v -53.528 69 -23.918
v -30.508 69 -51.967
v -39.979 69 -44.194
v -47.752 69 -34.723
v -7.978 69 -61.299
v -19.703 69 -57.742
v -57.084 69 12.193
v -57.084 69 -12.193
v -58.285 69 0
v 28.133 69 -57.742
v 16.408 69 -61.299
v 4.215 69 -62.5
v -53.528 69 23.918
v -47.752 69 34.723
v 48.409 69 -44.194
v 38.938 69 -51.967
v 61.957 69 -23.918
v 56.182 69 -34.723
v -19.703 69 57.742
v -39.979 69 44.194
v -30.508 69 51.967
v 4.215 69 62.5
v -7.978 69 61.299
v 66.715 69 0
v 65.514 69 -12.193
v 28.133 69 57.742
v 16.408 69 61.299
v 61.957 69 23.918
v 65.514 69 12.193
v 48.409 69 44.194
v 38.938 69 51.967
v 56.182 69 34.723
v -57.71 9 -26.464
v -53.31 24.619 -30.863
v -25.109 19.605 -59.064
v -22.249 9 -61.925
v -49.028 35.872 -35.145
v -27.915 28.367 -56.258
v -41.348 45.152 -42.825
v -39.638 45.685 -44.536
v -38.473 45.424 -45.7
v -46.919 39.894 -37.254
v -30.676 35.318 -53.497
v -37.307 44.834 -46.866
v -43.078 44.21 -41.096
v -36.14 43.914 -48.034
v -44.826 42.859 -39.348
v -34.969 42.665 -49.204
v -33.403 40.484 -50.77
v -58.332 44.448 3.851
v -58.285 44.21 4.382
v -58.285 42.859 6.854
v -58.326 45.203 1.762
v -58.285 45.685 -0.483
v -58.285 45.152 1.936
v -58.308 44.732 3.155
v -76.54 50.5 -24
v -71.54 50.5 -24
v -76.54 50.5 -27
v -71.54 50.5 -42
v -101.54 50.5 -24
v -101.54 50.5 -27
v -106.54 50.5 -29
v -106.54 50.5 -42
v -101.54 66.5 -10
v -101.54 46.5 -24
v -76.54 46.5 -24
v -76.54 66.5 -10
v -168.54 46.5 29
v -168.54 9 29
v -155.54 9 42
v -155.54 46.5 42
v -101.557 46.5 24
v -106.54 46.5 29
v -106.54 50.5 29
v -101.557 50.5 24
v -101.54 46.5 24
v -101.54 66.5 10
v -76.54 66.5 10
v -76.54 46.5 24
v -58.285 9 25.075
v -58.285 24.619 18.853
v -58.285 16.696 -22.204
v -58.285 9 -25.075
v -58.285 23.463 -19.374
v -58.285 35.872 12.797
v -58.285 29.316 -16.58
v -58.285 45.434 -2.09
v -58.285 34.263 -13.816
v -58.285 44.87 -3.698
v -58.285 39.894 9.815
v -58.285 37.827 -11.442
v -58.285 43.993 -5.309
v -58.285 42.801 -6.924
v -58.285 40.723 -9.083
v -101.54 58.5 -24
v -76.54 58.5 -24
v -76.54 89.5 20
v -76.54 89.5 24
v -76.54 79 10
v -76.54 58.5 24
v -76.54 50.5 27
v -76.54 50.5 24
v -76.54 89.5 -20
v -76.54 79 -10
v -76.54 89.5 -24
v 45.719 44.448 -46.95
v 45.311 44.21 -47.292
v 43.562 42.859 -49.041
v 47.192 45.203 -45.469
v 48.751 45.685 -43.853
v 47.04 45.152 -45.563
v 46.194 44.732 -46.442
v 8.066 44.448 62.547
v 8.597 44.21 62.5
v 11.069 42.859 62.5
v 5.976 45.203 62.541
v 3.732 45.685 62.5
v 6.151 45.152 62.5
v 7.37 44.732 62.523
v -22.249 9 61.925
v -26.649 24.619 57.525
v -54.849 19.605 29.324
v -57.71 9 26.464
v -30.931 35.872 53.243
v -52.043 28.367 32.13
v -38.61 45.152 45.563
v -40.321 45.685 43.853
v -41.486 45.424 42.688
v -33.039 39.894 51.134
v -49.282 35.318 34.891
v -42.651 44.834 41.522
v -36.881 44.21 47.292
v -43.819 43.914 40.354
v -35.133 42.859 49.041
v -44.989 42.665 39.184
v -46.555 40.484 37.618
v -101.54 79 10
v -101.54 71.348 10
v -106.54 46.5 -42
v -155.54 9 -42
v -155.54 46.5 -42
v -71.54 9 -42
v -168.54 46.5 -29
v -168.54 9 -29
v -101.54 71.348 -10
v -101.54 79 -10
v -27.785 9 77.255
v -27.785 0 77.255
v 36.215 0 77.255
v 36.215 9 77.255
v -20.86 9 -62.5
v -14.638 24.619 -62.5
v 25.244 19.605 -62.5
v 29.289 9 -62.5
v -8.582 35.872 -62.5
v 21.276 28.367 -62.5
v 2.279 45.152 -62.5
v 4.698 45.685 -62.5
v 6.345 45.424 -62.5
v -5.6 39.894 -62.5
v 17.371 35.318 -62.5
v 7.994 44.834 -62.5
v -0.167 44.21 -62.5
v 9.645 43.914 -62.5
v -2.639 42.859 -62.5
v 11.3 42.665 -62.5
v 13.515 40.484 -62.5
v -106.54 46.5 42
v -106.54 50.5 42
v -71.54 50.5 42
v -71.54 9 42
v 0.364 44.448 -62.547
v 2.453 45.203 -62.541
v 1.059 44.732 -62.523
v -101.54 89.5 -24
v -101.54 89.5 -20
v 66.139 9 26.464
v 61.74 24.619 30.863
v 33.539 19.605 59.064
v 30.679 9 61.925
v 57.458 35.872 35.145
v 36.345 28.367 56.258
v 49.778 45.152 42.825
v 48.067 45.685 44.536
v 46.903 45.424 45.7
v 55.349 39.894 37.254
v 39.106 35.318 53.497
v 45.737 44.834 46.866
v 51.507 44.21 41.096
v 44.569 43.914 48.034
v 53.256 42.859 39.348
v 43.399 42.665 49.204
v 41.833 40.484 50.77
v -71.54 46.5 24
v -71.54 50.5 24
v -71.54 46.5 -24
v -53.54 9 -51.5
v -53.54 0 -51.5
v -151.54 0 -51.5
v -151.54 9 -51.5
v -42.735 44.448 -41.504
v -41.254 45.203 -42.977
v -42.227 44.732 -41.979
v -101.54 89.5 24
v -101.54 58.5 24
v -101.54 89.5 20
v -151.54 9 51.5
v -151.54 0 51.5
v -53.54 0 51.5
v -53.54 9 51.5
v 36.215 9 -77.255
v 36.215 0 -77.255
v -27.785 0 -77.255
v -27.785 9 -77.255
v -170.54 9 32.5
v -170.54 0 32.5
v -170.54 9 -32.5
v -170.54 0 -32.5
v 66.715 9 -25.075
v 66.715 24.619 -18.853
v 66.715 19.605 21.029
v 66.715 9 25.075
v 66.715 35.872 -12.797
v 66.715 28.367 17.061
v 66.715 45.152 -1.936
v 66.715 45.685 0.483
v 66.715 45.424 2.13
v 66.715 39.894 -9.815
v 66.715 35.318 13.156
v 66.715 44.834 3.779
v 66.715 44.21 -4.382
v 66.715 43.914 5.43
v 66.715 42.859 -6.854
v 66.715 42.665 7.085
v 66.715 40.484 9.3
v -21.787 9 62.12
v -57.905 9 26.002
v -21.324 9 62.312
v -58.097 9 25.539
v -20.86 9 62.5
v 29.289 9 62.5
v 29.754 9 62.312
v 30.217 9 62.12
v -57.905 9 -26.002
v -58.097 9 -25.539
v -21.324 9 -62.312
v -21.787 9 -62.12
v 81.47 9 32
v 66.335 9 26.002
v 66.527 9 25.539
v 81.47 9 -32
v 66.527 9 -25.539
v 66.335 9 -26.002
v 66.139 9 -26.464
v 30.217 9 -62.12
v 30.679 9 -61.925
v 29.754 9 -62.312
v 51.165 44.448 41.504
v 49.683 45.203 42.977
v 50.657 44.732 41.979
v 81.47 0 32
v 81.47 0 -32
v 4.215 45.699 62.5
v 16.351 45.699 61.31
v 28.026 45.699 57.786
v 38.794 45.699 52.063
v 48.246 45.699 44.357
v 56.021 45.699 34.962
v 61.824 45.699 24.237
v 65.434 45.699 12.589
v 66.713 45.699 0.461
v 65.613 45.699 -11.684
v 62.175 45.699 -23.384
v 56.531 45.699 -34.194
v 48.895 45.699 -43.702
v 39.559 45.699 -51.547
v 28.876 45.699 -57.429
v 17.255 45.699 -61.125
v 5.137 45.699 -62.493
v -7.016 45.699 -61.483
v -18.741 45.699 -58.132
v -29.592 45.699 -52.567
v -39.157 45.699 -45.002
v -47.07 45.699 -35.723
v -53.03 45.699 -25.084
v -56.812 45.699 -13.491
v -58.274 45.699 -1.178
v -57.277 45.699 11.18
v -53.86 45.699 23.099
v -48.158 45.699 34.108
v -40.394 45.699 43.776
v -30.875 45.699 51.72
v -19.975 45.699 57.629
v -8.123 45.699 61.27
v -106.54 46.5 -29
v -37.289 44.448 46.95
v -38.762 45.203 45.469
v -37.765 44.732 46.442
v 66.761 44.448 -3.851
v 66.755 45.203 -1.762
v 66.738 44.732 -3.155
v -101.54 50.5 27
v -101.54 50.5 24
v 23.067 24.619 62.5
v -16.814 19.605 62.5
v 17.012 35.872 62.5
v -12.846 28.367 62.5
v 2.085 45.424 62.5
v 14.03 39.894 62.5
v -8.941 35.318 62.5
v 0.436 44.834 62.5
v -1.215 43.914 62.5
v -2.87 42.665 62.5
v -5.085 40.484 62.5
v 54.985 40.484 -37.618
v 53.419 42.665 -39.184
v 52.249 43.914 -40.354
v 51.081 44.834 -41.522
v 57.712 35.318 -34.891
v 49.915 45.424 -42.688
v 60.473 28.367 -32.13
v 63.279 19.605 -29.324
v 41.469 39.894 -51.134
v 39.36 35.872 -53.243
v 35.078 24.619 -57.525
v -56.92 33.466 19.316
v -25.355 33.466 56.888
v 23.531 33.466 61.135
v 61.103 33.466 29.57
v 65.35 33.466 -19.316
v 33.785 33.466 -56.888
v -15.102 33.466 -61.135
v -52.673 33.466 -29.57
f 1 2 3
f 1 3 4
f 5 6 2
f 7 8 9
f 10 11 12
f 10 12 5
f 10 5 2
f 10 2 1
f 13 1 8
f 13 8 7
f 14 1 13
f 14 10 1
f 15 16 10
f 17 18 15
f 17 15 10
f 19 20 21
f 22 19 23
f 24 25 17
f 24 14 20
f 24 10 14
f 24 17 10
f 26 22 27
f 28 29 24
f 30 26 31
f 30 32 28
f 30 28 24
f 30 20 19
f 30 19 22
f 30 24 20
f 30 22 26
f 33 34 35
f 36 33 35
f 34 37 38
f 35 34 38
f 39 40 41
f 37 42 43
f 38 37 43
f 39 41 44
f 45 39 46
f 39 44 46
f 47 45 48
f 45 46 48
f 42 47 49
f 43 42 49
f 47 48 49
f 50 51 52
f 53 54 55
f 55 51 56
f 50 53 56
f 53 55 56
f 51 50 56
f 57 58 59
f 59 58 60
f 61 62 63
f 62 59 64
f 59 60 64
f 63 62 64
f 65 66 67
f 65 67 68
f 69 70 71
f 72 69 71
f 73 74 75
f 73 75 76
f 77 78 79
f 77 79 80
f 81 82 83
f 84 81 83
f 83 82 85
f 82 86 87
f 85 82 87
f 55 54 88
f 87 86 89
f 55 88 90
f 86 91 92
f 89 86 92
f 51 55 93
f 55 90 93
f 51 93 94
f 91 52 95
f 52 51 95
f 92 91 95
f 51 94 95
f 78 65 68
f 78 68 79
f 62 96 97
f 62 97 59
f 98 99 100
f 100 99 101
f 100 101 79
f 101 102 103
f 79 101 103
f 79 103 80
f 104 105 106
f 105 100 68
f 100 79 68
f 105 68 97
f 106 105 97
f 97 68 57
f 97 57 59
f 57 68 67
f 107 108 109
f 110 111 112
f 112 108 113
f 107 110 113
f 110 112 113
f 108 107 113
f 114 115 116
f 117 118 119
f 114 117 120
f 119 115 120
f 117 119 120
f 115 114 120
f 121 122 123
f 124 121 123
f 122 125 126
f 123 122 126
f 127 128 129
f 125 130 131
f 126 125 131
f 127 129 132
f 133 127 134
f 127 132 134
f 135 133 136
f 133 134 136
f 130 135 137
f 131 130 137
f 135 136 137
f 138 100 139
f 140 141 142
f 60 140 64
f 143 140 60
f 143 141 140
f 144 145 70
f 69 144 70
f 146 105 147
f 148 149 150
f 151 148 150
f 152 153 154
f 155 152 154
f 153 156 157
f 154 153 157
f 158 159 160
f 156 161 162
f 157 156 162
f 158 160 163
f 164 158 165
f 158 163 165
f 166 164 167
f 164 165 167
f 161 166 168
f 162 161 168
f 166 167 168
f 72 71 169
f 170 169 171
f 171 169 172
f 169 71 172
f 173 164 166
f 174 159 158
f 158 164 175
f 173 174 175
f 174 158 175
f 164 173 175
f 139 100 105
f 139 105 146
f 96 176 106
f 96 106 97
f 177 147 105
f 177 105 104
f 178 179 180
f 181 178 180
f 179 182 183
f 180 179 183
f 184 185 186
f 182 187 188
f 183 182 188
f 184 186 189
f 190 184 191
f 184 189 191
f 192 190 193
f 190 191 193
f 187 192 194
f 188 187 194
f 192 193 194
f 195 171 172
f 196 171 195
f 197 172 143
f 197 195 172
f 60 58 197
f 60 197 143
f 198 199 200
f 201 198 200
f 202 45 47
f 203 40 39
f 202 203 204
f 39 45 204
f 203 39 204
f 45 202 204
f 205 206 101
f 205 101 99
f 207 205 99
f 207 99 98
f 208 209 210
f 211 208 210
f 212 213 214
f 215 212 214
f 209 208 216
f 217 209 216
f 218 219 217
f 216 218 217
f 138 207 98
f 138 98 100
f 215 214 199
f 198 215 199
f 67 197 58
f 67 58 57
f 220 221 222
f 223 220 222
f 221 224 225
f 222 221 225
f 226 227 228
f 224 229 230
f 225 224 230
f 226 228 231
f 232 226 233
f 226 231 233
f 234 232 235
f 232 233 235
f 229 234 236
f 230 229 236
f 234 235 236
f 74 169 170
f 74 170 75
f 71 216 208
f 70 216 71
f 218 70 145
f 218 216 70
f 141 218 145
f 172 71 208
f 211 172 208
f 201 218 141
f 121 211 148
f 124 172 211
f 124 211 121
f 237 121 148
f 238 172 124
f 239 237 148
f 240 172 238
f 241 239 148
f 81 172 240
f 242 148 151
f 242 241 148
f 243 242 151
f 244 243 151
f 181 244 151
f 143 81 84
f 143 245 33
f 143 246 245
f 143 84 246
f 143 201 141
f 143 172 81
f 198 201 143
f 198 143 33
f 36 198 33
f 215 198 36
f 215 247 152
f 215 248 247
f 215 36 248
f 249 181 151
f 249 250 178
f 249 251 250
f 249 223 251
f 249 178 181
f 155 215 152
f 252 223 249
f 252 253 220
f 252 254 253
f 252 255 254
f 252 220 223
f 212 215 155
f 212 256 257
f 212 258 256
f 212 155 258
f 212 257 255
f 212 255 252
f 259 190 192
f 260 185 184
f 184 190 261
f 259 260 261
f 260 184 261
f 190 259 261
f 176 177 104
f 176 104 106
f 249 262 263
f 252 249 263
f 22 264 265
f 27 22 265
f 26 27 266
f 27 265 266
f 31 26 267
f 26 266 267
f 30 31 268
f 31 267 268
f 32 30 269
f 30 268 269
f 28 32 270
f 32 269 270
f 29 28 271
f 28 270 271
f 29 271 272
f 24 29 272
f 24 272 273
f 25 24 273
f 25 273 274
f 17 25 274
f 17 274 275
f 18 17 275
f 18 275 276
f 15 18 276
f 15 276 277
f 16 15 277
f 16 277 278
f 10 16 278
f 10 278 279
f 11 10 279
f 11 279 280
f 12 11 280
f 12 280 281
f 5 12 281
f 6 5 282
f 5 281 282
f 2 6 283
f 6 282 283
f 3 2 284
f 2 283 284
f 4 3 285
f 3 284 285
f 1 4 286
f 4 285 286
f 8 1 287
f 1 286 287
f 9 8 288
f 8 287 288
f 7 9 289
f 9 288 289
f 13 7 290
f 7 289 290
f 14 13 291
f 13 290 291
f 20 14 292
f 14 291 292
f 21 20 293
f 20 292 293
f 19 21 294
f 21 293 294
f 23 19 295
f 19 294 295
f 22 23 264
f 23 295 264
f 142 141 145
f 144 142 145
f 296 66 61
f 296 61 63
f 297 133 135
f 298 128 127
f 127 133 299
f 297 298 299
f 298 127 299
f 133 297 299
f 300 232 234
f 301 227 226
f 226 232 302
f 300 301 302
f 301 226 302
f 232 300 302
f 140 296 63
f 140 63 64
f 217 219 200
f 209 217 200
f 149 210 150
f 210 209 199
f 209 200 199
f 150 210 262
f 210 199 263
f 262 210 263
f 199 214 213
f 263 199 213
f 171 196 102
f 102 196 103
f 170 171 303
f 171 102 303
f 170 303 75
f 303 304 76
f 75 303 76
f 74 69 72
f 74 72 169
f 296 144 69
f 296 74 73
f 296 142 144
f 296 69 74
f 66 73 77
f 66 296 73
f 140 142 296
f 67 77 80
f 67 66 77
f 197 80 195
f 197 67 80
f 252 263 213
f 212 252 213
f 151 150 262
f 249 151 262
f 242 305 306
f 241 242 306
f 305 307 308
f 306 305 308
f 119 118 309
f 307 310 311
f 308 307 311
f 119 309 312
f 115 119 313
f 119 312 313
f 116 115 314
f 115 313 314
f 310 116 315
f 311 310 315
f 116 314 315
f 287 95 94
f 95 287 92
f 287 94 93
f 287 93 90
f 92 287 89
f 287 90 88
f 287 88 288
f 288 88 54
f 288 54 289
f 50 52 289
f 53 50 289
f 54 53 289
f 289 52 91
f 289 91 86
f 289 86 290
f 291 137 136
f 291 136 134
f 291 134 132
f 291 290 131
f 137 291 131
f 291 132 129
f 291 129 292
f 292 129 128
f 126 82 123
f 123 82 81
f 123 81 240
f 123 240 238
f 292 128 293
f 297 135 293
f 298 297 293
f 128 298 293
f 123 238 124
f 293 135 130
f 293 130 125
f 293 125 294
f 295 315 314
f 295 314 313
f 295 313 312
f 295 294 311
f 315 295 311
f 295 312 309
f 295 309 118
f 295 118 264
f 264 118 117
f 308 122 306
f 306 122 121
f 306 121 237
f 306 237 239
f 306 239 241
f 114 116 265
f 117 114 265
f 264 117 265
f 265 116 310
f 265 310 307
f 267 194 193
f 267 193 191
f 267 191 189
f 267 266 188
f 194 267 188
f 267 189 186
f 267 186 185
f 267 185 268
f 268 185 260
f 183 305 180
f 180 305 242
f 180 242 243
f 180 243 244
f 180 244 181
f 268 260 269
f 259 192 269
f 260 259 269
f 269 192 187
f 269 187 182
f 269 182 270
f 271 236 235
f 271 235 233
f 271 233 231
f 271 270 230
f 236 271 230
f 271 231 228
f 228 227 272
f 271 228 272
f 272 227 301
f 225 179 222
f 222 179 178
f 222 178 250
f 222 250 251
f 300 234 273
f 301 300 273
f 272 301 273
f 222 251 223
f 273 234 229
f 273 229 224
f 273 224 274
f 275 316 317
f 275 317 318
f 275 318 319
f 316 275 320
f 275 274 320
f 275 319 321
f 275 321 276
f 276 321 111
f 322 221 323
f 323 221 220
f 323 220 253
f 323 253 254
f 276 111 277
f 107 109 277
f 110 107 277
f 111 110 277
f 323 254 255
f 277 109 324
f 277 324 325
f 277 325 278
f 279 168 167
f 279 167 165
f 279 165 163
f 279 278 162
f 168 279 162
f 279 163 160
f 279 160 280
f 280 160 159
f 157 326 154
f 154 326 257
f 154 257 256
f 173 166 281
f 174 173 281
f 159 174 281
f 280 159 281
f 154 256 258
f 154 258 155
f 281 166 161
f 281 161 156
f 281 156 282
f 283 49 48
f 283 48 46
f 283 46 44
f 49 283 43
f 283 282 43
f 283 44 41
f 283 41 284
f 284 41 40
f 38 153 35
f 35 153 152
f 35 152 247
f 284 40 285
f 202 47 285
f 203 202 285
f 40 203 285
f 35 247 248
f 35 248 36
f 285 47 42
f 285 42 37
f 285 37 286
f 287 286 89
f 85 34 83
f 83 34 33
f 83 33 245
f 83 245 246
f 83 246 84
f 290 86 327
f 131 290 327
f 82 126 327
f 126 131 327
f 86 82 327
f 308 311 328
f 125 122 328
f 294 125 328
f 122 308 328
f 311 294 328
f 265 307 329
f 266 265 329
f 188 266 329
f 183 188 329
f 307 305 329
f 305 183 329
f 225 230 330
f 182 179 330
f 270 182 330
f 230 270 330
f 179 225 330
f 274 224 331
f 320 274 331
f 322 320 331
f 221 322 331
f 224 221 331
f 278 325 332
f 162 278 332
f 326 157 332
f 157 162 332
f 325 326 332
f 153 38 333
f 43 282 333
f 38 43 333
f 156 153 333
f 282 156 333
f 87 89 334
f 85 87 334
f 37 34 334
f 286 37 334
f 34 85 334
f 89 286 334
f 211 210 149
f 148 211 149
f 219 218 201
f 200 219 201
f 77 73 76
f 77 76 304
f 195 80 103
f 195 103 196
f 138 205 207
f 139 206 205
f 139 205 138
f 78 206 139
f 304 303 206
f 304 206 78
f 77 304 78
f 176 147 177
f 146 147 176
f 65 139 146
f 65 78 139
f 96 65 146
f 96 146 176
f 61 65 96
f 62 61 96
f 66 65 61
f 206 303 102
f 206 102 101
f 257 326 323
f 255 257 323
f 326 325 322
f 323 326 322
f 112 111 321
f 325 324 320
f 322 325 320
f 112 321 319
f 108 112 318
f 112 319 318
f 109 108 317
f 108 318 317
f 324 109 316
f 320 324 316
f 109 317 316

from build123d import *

# Parameters (mm, degrees)
EXTRUDE_1_DEPTH     = 9
CUT_EXTRUDE_2_DEPTH = 9
SKETCH_4_R          = 63.5
EXTRUDE_2_DEPTH     = 60
EXTRUDE_3_DEPTH     = 37.5
EXTRUDE_4_DEPTH     = 4
EXTRUDE_5_DEPTH     = 25
EXTRUDE_6_DEPTH     = 25
EXTRUDE_7_DEPTH     = 25
CUT_EXTRUDE2_START  = -60
SKETCH4_R           = 63.5
SKETCH4_R_2         = 62.5
CUT_EXTRUDE2_DEPTH  = 60
CUT_EXTRUDE4_DEPTH  = 6.8
CIRPATTERN1_COUNT   = 8
SKETCH15_W          = 73.49693164
SKETCH15_H          = 33.050154469
BOSS_EXTRUDE4_DEPTH = 16
SKETCH16_W          = 25
SKETCH16_H          = 20
BOSS_EXTRUDE5_DEPTH = 10
CUT_EXTRUDE5_DEPTH  = 20
SKETCH19_W          = 10
SKETCH19_H          = 84
CUT_EXTRUDE6_DEPTH  = 41.5


with BuildPart() as part:
    # 草图1 → 凸台-拉伸1 (new body)
    with BuildSketch(Plane(origin=(0, 0, 0), x_dir=(1, 0, 0), z_dir=(0, 1, 0))):
        Polygon((81.469684938, 32), (36.214850942, 77.254833996), (-27.785149058, 77.254833996), (-53.539983054, 51.5), (-170.539983054, 51.5), (-170.539983054, -51.5), (-53.539983054, -51.5), (-27.785149058, -77.254833996), (36.214850942, -77.254833996), (81.469684938, -32), align=None)
    extrude(amount=EXTRUDE_1_DEPTH)

    # 草图2 → 切除-拉伸2 (cut)
    with BuildSketch(Plane(origin=(0, 9, 0), x_dir=(1, 0, 0), z_dir=(0, 1, 0))):
        Polygon((-151.539983054, -51.5), (-170.539983054, -32.5), (-170.539983054, -51.5), align=None)
        Polygon((-170.539983054, 51.5), (-170.539983054, 32.5), (-151.539983054, 51.5), align=None)
    extrude(amount=-CUT_EXTRUDE_2_DEPTH, mode=Mode.SUBTRACT)

    # 草图4 → 凸台-拉伸2 (add)
    with BuildSketch(Plane(origin=(0, 9, 0), x_dir=(1, 0, 0), z_dir=(0, 1, 0))):
        with Locations(Location((4.214850942, 0, 0), (0, 0, 270))):
            Circle(SKETCH_4_R)
    extrude(amount=EXTRUDE_2_DEPTH)

    # 草图5 → 凸台-拉伸3 (add)
    with BuildSketch(Plane(origin=(0, 9, 0), x_dir=(1, 0, 0), z_dir=(0, 1, 0))):
        Polygon((-155.539983054, -42), (-61.539983054, -42), (-61.539983054, 42), (-155.539983054, 42), (-168.539983054, 29), (-168.539983054, -29), align=None)
    extrude(amount=EXTRUDE_3_DEPTH)

    # 草图7 → 凸台-拉伸4 (add)
    with BuildSketch(Plane(origin=(0, 46.5, 0), x_dir=(1, 0, 0), z_dir=(0, 1, 0))):
        Polygon((-106.539983054, 42), (-61.539983054, 42), (-61.539983054, 29), (-66.539983054, 24), (-101.539983054, 24), (-106.539983054, 29), align=None)
        Polygon((-106.539983054, -29), (-101.557170407, -24), (-66.5227957, -24), (-61.539983054, -29), (-61.539983054, -42), (-106.539983054, -42), align=None)
    extrude(amount=EXTRUDE_4_DEPTH)

    # 草图8 → 凸台-拉伸5 (add)
    with BuildSketch(Plane.ZY.offset(101.539983054)):
        Polygon((-24, 46.5), (-10, 66.5), (10, 66.5), (24, 46.5), (24, 89.5), (20, 89.5), (10, 79), (10, 75), (-10, 75), (-10, 79), (-20, 89.5), (-24, 89.5), align=None)
    extrude(amount=-EXTRUDE_5_DEPTH)

    # 草图12 → 凸台-拉伸6 (add)
    with BuildSketch(Plane.ZY.offset(101.539983054)):
        Polygon((-24, 58.5), (-27, 50.5), (-24, 50.5), align=None)
    extrude(amount=-EXTRUDE_6_DEPTH)

    # 草图15 → 凸台-拉伸7 (add)
    with BuildSketch(Plane.ZY.offset(101.539983054)):
        Polygon((24, 50.5), (27, 50.5), (24, 58.5), align=None)
    extrude(amount=-EXTRUDE_7_DEPTH)

    # Sketch4 → Cut-Extrude2 (cut)
    with BuildSketch(Plane(origin=(0, 69, 0), x_dir=(1, 0, 0), z_dir=(0, 1, 0)).offset(CUT_EXTRUDE2_START)):
        with Locations((4.214850942, 0)):
            Circle(SKETCH4_R)
        with Locations(Location((4.214850942, 0, 0), (0, 0, 270))):
            Circle(SKETCH4_R_2, mode=Mode.SUBTRACT)
    extrude(amount=CUT_EXTRUDE2_DEPTH, mode=Mode.SUBTRACT)

    # Sketch9 → Revolve2 (revolve)
    with BuildSketch(Plane.XY, mode=Mode.PRIVATE) as revolve2_sk:
        Polygon((66.714850942, 45.698851706), (71.557167148, 9), (66.714850942, 9), align=None)
    revolve(revolve2_sk.sketch.rotate(Axis((4.214850942, 69, 0), (0, 1, 0)), 167.534637939), axis=Axis((4.214850942, 69, 0), (0, 1, 0)))

    # Sketch12 → Cut-Extrude4 (cut)
    with BuildSketch(Plane.XY.offset(62.5)):
        with BuildLine():
            Line((36.214850942, 9), (-27.785149058, 9))
            add(Edge.make_bspline(
                [(-27.785149058, 9), (-0.604837494, 82.63399563), (36.214850942, 9)],
                knots=[0, 0, 0, 1, 1, 1], degree=2))
        make_face()
    cut_extrude4 = extrude(amount=CUT_EXTRUDE4_DEPTH, mode=Mode.SUBTRACT)

    # CirPattern1: Cut-Extrude4 ×8 about axis
    cirpattern1_axis = Axis((4.214850942, 69, 0), (0, 1, 0))
    for i in range(1, CIRPATTERN1_COUNT):
        add(cut_extrude4.rotate(cirpattern1_axis, i * 360 / CIRPATTERN1_COUNT), mode=Mode.SUBTRACT)

    # Sketch15 → Boss-Extrude4 (add)
    with BuildSketch(Plane(origin=(-61.539983054, 0, 0), x_dir=(0, 0, -1), z_dir=(1, 0, 0))):
        with Locations((3.027242224, 22.608056987)):
            Rectangle(SKETCH15_W, SKETCH15_H)
    extrude(amount=-BOSS_EXTRUDE4_DEPTH)

    # Sketch16 → Boss-Extrude5 (add)
    with BuildSketch(Plane(origin=(0, 75, 0), x_dir=(1, 0, 0), z_dir=(0, 1, 0))):
        with Locations((-89.039983054, 0)):
            Rectangle(SKETCH16_W, SKETCH16_H)
    extrude(amount=BOSS_EXTRUDE5_DEPTH)

    # Sketch17 → Cut-Extrude5 (cut)
    with BuildSketch(Plane.XY.offset(10)):
        Polygon((-76.539983054, 79), (-101.539983054, 71.348105906), (-101.539983054, 89.5), (-76.539983054, 89.5), align=None)
    extrude(amount=-CUT_EXTRUDE5_DEPTH, mode=Mode.SUBTRACT)

    # Sketch19 → Cut-Extrude6 (cut)
    with BuildSketch(Plane(origin=(0, 50.5, 0), x_dir=(1, 0, 0), z_dir=(0, 1, 0))):
        with Locations((-66.539983054, 0)):
            Rectangle(SKETCH19_W, SKETCH19_H)
    extrude(amount=-CUT_EXTRUDE6_DEPTH, mode=Mode.SUBTRACT)


solid = part.part
